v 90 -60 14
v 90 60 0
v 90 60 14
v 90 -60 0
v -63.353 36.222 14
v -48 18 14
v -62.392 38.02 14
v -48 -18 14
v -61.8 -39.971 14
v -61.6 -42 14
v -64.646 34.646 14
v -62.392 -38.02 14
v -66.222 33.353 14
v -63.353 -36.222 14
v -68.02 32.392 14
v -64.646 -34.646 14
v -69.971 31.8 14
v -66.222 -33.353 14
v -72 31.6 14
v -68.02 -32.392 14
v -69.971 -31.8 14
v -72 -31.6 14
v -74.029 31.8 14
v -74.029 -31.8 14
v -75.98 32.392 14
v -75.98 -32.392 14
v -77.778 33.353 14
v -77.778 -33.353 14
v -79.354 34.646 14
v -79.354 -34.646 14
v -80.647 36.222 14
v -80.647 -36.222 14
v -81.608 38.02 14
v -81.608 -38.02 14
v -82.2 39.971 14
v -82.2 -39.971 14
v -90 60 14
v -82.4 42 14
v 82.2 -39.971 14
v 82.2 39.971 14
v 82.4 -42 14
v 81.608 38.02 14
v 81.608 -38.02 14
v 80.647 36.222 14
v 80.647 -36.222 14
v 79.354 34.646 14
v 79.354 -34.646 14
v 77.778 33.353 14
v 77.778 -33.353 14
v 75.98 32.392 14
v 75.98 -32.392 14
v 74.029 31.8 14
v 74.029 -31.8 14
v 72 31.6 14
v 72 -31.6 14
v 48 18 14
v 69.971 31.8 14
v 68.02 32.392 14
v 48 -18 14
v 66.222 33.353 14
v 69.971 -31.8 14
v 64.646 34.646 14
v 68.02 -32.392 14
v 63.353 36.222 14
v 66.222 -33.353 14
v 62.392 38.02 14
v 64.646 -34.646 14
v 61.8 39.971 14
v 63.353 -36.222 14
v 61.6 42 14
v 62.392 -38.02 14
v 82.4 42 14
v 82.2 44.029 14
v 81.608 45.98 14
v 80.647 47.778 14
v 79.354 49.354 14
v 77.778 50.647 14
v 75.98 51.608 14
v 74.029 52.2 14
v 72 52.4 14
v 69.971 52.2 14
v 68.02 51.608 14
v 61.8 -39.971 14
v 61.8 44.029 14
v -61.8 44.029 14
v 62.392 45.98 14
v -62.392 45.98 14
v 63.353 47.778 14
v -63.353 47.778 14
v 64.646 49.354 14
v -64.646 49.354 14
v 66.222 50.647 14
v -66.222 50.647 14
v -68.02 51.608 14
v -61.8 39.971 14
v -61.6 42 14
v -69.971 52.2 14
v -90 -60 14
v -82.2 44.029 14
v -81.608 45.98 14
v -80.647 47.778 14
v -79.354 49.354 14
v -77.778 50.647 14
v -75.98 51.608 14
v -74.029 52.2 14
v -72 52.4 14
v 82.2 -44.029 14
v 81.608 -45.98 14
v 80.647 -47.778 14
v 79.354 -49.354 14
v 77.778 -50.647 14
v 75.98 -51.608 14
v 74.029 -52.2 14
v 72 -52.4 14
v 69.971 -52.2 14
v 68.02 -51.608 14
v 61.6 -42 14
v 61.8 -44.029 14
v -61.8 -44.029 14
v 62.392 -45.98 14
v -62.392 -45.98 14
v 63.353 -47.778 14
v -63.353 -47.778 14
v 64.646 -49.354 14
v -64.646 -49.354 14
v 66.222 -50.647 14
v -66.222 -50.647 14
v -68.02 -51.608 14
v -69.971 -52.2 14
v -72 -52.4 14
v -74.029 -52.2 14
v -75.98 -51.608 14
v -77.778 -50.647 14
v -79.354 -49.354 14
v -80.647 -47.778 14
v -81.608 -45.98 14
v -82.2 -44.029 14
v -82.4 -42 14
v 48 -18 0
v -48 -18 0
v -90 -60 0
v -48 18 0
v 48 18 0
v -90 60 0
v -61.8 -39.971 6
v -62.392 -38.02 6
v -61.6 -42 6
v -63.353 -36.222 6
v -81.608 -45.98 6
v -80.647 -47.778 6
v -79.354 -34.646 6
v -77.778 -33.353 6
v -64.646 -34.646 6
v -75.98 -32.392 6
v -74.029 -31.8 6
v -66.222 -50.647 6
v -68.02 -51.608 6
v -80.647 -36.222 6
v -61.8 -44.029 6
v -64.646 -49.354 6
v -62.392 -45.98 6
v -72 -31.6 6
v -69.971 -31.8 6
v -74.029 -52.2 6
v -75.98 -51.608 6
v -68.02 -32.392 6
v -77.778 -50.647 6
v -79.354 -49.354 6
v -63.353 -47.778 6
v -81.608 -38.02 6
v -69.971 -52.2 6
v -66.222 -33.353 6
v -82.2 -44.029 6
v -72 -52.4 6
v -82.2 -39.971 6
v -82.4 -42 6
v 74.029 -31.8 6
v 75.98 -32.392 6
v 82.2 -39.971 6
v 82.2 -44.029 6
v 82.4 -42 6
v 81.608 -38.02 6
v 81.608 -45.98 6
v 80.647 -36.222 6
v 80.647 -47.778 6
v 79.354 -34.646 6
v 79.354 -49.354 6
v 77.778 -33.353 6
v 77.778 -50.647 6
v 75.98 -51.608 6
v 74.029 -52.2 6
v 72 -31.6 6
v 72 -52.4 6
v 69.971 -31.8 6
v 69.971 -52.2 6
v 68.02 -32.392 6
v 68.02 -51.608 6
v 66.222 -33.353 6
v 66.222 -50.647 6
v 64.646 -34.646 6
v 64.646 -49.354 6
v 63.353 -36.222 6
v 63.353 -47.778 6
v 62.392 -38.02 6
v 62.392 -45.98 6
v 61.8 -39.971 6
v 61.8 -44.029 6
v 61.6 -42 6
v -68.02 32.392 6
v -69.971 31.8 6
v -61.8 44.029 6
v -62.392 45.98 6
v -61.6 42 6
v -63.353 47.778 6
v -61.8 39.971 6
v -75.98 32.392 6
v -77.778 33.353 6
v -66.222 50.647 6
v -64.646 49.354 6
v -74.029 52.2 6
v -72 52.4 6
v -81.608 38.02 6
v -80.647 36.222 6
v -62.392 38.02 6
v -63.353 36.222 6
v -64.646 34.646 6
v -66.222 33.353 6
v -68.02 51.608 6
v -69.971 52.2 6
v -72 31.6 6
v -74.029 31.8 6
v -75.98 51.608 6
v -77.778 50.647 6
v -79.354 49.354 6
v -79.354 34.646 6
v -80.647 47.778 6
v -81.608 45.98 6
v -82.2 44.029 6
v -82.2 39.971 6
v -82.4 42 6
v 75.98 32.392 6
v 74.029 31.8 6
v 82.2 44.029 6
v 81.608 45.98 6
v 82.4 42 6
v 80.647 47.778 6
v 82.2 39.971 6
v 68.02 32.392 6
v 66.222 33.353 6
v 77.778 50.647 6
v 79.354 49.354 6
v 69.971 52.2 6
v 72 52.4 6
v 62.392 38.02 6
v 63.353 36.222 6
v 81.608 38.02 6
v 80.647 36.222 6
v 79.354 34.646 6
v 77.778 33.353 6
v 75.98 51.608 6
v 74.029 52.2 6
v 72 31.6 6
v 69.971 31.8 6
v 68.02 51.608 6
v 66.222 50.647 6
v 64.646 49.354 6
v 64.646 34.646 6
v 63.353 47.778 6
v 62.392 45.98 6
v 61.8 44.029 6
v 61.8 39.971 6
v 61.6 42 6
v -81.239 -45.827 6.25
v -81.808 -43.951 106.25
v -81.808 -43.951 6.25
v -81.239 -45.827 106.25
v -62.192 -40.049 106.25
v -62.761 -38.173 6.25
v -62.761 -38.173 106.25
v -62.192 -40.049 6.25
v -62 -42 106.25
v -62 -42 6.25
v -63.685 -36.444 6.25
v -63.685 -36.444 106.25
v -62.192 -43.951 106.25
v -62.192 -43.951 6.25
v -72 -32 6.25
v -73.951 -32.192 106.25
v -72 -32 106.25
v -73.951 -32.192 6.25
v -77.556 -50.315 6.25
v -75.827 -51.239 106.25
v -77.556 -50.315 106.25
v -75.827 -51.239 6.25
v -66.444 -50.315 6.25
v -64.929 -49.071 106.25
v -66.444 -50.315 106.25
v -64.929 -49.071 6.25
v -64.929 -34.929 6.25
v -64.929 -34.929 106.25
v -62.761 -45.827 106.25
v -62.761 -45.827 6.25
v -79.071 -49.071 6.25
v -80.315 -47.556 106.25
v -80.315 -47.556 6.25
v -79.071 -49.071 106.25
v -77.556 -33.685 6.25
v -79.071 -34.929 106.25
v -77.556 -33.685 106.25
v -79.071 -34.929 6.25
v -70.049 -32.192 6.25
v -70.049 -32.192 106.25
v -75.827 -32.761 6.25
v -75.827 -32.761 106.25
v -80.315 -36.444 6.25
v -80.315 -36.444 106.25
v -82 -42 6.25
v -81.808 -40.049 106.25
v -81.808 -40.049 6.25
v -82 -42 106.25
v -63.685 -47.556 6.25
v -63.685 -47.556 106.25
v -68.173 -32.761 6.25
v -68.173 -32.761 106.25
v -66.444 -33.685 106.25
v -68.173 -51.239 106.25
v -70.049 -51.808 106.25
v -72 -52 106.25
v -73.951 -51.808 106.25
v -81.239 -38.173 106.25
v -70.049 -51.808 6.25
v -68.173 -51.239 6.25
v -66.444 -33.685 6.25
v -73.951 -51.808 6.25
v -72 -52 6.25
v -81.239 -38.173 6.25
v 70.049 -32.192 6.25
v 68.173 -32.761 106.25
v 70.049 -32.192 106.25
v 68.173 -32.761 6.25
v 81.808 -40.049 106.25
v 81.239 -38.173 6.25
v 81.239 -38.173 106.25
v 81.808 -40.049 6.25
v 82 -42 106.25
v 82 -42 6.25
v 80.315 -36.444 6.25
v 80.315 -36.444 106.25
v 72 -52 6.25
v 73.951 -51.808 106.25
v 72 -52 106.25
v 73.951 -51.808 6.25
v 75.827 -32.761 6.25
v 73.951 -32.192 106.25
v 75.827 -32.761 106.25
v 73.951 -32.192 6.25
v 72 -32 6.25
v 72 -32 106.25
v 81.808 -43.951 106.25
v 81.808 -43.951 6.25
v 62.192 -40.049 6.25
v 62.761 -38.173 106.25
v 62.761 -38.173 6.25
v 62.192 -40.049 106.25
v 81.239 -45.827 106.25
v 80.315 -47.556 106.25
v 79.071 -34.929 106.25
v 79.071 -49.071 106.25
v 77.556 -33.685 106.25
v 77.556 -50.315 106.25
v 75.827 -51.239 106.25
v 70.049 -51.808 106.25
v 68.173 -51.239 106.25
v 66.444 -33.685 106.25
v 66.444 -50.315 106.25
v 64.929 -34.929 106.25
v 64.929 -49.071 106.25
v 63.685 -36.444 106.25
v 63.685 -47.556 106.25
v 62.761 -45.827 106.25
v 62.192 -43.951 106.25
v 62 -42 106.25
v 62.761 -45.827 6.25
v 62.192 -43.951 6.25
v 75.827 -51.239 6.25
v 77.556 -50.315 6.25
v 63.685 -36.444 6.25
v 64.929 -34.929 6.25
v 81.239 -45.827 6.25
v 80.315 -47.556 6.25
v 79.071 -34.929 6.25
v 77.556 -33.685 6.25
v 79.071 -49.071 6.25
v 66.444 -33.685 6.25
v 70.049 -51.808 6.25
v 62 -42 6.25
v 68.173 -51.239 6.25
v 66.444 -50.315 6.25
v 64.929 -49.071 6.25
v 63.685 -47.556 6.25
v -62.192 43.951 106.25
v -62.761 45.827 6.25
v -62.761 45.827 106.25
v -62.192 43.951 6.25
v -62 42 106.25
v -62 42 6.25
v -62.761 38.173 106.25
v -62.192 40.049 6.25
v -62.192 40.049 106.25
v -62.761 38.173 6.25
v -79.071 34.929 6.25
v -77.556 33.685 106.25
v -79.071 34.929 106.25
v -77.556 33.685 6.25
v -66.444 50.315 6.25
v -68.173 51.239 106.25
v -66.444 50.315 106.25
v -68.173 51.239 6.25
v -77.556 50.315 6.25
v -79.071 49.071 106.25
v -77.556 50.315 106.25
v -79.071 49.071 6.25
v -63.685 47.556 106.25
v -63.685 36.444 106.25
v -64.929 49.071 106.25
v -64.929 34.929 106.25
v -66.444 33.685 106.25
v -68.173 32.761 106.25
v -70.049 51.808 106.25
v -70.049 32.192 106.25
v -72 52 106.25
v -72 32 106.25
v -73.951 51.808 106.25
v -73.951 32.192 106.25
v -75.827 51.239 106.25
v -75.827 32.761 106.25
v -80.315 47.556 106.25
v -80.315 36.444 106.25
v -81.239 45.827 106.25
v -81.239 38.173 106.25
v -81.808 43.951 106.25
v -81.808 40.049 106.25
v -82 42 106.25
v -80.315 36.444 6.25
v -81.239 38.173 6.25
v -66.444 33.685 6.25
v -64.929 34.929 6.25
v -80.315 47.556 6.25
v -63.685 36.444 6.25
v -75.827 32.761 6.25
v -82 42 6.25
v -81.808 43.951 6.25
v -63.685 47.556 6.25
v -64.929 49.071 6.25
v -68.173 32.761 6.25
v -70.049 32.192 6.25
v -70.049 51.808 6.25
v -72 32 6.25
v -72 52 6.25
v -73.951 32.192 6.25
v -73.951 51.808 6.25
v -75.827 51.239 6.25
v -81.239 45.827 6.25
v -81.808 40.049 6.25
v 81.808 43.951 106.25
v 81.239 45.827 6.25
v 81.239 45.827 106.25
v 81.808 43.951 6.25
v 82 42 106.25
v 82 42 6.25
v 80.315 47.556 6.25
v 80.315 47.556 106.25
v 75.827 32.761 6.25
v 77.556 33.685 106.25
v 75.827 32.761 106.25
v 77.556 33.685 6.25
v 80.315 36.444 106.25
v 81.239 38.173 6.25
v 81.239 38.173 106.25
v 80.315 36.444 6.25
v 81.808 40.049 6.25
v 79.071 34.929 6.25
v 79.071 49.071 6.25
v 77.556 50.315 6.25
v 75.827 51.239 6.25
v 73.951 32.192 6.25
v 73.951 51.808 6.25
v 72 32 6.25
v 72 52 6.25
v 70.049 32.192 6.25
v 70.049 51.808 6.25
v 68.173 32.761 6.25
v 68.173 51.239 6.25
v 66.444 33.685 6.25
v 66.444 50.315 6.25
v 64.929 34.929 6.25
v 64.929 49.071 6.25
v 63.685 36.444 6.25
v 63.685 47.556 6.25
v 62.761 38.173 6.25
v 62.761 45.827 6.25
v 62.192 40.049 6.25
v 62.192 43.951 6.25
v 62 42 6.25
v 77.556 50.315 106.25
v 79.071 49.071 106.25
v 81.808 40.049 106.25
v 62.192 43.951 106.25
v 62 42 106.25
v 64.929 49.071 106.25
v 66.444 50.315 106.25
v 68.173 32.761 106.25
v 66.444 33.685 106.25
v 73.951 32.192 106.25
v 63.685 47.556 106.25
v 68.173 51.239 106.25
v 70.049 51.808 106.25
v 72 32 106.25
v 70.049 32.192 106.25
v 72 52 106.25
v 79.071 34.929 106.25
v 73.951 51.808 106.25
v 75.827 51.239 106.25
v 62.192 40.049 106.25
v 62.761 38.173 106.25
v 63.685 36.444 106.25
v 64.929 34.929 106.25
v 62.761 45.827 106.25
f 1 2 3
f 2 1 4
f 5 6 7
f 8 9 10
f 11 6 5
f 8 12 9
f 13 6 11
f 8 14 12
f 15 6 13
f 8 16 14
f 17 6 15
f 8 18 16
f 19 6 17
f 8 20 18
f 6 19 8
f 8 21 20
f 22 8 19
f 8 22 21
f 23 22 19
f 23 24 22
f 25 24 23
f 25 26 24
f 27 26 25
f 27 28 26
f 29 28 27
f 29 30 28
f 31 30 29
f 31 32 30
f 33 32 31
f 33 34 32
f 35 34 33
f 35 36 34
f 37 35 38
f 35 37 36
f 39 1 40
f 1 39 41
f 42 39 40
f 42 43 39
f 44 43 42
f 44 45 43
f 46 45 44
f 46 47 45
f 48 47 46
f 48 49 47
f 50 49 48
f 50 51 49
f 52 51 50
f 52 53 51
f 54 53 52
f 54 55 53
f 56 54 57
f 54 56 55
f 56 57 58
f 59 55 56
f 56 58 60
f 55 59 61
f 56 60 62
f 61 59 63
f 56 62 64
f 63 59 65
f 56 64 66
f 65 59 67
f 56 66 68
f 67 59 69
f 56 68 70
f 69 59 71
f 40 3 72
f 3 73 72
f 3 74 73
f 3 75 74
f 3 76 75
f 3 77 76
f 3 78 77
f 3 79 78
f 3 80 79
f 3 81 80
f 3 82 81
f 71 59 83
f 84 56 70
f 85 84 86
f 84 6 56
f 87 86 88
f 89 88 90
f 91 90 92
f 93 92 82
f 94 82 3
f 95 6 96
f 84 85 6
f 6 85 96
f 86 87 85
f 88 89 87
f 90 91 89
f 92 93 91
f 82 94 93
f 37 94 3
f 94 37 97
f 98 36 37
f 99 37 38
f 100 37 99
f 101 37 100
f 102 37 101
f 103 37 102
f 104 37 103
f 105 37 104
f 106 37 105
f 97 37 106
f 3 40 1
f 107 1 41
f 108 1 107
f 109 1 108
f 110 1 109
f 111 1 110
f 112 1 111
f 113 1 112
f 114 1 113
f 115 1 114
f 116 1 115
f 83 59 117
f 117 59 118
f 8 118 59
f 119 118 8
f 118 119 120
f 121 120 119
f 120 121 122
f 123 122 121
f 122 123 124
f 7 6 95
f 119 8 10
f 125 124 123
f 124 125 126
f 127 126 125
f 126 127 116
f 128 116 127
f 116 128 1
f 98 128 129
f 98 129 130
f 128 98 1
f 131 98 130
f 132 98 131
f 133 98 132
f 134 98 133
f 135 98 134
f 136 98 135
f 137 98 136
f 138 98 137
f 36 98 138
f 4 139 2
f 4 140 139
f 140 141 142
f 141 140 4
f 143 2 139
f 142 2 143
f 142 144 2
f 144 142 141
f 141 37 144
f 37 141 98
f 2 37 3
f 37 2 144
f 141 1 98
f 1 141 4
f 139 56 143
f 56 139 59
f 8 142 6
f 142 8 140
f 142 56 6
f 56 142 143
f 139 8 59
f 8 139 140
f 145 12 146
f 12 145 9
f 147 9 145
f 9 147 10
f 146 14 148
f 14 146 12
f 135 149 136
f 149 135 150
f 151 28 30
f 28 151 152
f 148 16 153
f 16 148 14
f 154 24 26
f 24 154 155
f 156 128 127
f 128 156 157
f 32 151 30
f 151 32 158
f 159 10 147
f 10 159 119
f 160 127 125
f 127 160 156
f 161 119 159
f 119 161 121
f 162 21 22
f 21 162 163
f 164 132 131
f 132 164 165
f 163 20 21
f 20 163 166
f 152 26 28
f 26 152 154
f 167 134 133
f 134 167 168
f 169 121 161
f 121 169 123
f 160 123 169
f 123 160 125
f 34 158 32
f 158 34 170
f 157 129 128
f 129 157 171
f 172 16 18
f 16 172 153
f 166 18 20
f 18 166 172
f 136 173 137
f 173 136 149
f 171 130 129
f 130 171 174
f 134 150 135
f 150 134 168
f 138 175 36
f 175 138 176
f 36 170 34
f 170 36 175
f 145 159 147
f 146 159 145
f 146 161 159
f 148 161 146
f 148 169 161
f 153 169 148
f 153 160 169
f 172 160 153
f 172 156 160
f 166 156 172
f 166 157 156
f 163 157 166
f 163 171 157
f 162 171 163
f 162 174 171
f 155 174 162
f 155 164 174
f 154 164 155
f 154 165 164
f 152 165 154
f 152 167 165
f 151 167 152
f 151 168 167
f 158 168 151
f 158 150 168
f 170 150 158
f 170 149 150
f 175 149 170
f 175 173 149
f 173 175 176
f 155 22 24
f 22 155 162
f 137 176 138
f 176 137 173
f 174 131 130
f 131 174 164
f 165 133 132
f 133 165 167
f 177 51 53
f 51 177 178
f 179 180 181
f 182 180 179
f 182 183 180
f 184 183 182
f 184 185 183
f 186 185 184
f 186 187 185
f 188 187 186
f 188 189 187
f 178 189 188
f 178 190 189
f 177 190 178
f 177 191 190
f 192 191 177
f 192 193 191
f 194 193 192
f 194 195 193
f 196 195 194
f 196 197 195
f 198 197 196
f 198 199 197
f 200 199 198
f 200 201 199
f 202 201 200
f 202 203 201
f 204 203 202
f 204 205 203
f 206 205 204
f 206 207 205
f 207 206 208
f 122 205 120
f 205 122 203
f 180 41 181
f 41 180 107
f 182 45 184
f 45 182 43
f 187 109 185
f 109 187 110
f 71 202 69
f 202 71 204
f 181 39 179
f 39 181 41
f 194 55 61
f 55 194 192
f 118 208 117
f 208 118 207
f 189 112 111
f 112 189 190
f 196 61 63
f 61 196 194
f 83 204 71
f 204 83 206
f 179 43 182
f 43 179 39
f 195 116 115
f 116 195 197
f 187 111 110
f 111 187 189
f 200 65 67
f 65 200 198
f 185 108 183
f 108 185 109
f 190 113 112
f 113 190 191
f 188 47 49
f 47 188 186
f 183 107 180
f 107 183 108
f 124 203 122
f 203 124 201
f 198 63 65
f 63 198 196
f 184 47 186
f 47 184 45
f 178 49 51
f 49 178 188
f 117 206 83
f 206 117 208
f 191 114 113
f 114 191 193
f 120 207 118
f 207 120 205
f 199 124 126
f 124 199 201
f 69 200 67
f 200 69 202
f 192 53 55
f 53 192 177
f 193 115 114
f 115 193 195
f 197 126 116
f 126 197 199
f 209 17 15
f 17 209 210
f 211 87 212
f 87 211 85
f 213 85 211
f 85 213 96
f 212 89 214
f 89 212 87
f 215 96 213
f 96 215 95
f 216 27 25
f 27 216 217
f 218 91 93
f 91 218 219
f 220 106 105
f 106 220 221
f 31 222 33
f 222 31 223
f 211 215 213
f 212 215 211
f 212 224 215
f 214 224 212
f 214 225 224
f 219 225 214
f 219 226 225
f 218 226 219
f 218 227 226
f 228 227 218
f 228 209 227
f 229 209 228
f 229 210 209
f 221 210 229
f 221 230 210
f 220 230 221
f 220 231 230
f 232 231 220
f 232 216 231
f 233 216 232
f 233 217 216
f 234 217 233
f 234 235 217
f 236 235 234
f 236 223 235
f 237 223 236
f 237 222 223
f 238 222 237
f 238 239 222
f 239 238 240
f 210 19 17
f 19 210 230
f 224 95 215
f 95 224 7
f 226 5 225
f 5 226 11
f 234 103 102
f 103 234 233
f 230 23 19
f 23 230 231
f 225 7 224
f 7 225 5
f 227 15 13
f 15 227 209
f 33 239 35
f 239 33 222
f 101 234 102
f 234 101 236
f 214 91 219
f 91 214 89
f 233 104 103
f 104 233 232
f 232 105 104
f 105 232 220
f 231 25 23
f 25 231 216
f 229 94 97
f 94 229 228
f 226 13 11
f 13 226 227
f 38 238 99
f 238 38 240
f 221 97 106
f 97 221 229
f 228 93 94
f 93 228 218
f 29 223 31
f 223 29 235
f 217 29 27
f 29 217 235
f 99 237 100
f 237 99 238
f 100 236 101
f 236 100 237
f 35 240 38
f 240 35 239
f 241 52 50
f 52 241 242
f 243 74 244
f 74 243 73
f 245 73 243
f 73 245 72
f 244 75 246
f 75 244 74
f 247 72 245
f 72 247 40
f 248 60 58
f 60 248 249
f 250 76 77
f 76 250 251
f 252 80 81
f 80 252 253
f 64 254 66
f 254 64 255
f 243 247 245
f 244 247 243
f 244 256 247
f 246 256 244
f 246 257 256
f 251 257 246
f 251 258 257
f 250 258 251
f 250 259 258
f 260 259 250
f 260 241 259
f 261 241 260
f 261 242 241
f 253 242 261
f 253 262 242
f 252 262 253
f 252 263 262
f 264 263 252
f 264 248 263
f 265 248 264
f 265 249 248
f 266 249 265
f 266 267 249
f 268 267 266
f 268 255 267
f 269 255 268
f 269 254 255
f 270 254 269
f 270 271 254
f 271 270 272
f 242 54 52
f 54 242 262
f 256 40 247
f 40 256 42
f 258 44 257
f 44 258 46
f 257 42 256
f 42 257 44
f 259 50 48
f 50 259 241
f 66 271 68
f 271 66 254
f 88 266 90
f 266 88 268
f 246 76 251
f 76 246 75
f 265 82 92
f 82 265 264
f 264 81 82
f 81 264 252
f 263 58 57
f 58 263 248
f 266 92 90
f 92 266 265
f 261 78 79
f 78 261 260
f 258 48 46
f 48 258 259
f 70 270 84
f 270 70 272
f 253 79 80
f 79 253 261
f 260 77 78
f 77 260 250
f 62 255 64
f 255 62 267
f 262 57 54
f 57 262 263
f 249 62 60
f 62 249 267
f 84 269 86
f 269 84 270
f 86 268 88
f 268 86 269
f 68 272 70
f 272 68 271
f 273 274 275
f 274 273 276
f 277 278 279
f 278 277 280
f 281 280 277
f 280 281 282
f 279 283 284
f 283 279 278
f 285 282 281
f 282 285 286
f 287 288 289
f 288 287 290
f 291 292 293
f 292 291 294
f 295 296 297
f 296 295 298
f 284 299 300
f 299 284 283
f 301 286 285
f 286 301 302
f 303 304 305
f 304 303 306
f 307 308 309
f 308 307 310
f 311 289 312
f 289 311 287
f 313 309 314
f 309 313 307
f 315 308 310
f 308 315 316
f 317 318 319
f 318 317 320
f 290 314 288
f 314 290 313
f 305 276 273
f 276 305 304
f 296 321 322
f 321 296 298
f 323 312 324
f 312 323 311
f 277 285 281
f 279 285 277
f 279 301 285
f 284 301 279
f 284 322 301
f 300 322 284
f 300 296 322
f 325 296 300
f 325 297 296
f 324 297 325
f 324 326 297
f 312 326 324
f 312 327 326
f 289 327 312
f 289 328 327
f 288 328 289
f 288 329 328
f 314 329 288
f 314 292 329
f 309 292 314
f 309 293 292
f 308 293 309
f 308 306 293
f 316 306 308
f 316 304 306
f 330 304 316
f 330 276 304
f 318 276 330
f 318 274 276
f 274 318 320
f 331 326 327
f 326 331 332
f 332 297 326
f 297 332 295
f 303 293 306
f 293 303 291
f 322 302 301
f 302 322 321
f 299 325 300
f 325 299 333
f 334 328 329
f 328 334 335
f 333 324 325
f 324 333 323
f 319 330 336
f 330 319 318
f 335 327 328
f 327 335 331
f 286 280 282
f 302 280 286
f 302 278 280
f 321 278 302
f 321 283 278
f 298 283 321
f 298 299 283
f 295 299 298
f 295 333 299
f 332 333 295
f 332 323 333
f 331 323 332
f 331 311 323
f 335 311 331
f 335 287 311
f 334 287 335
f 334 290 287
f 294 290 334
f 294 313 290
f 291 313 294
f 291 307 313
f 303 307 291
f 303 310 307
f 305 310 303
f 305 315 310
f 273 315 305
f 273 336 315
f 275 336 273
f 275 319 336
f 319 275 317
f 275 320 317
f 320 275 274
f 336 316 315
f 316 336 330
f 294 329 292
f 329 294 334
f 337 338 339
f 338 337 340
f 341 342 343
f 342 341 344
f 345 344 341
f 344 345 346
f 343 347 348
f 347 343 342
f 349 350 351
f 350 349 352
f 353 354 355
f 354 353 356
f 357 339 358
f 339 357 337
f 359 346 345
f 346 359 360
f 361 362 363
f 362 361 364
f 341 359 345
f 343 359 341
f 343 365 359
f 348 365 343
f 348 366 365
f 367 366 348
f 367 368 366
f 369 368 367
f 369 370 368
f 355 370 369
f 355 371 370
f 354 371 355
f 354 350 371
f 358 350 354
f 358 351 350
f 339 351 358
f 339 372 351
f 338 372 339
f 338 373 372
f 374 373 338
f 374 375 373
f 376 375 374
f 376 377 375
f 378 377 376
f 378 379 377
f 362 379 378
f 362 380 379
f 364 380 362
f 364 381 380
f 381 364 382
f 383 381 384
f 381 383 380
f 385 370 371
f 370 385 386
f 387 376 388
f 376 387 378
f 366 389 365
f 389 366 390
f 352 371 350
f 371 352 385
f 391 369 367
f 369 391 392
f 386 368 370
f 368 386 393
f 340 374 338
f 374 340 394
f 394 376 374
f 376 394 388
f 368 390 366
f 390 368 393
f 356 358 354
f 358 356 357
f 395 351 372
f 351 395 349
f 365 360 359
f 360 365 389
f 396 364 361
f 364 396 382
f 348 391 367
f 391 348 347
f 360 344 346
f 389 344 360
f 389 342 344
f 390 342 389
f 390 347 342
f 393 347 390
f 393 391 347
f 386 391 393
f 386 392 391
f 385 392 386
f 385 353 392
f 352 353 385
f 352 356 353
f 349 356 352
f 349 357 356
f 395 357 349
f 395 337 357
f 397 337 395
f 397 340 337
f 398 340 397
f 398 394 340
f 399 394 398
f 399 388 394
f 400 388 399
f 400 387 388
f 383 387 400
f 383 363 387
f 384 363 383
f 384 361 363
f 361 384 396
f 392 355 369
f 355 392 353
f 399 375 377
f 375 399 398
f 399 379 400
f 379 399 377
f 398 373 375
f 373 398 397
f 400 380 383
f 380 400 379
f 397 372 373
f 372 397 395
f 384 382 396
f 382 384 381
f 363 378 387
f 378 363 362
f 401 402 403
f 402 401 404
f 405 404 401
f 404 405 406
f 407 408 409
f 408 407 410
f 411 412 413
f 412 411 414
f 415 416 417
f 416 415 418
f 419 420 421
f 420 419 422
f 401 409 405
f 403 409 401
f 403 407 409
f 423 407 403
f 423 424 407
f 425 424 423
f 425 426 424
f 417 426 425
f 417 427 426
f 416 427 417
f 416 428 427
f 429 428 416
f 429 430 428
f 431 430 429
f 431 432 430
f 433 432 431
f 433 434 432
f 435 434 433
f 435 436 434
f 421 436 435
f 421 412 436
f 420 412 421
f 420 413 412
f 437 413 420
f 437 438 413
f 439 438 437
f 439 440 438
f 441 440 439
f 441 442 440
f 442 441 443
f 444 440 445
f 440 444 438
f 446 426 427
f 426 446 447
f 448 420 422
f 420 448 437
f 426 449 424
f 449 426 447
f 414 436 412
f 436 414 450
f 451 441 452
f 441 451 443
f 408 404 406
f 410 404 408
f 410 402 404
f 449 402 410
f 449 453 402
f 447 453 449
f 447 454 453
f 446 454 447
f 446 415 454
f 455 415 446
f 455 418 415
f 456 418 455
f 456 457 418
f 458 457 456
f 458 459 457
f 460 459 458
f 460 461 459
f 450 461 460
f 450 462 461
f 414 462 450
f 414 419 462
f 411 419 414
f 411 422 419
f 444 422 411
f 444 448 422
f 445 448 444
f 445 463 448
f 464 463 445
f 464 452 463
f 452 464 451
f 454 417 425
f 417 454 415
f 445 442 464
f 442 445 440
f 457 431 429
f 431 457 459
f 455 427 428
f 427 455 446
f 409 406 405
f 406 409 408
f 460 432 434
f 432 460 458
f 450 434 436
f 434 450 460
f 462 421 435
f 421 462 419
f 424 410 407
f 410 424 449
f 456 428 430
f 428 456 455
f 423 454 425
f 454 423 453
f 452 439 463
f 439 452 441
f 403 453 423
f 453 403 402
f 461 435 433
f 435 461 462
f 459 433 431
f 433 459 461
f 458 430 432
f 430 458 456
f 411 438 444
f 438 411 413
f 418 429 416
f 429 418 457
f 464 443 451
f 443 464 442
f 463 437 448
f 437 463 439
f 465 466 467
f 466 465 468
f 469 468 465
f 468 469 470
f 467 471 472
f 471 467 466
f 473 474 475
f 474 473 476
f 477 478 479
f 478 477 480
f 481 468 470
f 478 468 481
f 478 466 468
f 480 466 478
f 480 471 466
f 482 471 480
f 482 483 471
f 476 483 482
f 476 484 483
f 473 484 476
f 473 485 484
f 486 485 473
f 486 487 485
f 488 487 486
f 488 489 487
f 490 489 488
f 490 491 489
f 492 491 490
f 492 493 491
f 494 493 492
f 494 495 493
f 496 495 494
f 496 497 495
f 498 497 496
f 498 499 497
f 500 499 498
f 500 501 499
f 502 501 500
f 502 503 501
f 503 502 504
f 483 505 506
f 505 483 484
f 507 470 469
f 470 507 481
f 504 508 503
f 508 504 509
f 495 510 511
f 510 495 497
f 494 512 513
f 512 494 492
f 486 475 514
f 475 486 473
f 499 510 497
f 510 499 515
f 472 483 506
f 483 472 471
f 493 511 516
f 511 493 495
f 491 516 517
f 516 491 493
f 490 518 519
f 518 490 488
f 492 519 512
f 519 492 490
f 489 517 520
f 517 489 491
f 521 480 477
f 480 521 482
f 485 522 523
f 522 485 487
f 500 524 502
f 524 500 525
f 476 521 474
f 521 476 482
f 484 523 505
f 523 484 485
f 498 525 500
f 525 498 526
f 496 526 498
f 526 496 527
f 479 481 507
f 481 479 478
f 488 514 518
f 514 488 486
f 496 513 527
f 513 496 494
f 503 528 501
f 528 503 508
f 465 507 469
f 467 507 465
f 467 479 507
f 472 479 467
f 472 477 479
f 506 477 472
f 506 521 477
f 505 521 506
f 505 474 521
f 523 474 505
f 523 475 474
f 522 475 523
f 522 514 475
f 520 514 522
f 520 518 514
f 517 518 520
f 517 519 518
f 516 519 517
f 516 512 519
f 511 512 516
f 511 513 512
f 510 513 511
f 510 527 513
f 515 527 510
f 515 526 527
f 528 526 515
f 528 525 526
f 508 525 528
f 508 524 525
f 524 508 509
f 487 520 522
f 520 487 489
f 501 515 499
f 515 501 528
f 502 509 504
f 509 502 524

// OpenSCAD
$fn = 32;

// ------------------------------------------------------------------------
// Frame with four posts: 180 x 120 mm frame, four d20 posts
// Every part is its own module, assembly() places them once.
// ------------------------------------------------------------------------

// --- part 1 ---
module base_frame() {
  difference() {
    translate([-90, -60, 0]) cube([180, 120, 14]);
    translate([-48, -18, -1]) cube([96, 36, 16]);
    translate([-72, -42, 6]) cylinder(h = 9, d = 20.8);
    translate([72, -42, 6]) cylinder(h = 9, d = 20.8);
    translate([-72, 42, 6]) cylinder(h = 9, d = 20.8);
    translate([72, 42, 6]) cylinder(h = 9, d = 20.8);
  }
}

// --- part 2 ---
module post1() {
  cylinder(h = 100, d = 20);
}

// --- part 3 ---
module post2() {
  cylinder(h = 100, d = 20);
}

// --- part 4 ---
module post3() {
  cylinder(h = 100, d = 20);
}

// --- part 5 ---
module post4() {
  cylinder(h = 100, d = 20);
}

// --- assembly ---
module assembly() {
  translate([0, 0, 0]) rotate([0, 0, 0]) base_frame();
  translate([-72, -42, 6.25]) rotate([0, 0, 0]) post1();
  translate([72, -42, 6.25]) rotate([0, 0, 0]) post2();
  translate([-72, 42, 6.25]) rotate([0, 0, 0]) post3();
  translate([72, 42, 6.25]) rotate([0, 0, 0]) post4();
}

assembly();
